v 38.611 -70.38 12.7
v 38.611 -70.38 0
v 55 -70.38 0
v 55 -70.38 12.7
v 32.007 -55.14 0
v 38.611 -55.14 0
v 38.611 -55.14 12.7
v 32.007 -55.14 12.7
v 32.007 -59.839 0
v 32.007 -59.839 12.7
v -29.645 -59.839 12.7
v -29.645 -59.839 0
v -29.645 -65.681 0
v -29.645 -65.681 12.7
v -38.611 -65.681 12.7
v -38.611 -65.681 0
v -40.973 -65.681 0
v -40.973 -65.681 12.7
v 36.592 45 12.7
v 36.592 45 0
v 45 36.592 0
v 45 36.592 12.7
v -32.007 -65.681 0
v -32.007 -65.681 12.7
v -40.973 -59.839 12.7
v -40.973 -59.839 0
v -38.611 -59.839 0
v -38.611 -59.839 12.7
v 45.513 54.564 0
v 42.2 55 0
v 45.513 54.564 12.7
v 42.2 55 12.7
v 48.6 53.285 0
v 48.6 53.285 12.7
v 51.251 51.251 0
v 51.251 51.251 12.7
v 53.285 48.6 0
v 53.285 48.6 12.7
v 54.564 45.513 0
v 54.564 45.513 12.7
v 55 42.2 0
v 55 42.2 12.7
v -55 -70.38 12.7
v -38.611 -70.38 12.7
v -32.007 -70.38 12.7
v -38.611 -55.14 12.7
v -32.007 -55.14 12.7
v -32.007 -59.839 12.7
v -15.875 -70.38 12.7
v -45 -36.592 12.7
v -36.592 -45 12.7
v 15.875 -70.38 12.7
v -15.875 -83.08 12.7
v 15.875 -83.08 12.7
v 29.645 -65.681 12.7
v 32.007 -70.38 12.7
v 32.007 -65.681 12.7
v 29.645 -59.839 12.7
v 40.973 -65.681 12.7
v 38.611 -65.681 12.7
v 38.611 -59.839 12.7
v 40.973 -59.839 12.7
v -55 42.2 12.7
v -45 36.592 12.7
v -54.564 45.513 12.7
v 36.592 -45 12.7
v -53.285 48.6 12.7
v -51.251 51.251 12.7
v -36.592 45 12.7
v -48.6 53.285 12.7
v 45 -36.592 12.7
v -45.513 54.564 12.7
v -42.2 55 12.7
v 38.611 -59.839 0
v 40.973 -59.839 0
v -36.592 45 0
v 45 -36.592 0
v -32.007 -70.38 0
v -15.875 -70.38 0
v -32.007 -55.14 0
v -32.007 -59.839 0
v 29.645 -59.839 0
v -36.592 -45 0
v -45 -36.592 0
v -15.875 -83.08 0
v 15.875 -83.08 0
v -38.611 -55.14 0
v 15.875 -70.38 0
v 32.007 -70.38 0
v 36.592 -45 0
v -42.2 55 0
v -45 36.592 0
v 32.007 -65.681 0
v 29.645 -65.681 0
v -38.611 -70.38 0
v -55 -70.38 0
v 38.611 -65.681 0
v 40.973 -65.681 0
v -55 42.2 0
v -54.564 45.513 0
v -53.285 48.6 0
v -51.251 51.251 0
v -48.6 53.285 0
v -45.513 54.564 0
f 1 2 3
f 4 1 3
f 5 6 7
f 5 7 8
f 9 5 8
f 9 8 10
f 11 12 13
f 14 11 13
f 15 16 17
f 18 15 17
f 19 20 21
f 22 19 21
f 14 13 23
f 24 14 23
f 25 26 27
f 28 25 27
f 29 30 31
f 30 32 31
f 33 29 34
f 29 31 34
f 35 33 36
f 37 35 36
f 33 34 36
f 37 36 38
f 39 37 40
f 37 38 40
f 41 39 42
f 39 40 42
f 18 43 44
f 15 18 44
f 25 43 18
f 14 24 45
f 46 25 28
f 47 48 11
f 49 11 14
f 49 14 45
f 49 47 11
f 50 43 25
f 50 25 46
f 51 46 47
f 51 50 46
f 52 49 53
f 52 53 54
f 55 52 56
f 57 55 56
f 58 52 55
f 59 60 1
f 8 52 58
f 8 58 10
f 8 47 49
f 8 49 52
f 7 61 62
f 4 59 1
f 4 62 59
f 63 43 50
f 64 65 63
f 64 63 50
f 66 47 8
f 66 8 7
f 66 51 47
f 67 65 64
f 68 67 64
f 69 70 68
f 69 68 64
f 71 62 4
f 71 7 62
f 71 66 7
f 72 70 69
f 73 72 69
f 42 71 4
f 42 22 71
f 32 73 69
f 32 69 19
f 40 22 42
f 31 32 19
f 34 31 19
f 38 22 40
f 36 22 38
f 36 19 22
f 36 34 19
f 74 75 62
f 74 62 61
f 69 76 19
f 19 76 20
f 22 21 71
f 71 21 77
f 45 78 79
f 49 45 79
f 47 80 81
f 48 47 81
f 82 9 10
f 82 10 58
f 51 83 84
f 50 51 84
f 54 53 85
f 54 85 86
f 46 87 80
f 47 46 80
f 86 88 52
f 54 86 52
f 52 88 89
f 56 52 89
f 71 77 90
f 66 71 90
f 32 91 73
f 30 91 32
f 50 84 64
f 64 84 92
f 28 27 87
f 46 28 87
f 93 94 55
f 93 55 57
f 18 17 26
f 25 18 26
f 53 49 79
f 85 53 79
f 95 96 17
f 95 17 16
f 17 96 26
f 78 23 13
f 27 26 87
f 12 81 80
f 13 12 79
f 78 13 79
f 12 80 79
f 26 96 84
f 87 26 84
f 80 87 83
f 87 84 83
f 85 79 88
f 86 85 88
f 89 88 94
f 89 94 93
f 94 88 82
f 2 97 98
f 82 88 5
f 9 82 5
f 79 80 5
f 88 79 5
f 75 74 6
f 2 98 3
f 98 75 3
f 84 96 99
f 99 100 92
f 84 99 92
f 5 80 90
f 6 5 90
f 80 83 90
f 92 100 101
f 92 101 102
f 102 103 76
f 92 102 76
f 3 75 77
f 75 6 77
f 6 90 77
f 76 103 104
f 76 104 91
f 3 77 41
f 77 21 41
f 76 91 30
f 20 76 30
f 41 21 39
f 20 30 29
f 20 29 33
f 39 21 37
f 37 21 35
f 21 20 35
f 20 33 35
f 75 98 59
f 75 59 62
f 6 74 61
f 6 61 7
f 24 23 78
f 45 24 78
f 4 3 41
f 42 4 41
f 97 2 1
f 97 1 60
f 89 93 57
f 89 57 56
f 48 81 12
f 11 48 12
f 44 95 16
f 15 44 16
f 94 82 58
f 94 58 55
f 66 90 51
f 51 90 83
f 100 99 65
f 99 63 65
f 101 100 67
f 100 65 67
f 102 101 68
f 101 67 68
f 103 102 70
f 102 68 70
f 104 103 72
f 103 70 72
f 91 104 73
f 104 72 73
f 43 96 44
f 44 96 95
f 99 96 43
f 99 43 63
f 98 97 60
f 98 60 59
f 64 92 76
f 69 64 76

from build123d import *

# Parameters (mm, degrees)
SKETCH2_W           = 110
SKETCH2_H           = 125.38
BOSS_EXTRUDE1_DEPTH = 12.7
FILLET1_R           = 12.8
CUT_EXTRUDE1_DEPTH  = 12.7
BOSS_EXTRUDE2_DEPTH = 12.7


with BuildPart() as part:
    # Sketch2 → Boss-Extrude1 (new body)
    with BuildSketch(Plane.XY):
        with Locations((0, -7.69)):
            Rectangle(SKETCH2_W, SKETCH2_H)
        Polygon((-45, -36.592348927), (-45, 36.592348927), (-36.592348927, 45), (36.592348927, 45), (45, 36.592348927), (45, -36.592348927), (36.592348927, -45), (-36.592348927, -45), align=None, mode=Mode.SUBTRACT)
    extrude(amount=BOSS_EXTRUDE1_DEPTH)

    # Fillet1
    fillet1_edges = [part.edges().sort_by_distance(p)[0] for p in [
        (55, 55, 6.35),
        (-55, 55, 6.35),
    ]]
    fillet(fillet1_edges, radius=FILLET1_R)

    # Sketch5 → Cut-Extrude1 (cut)
    with BuildSketch(Plane(origin=(0, 0, 0), x_dir=(-1, 0, 0), z_dir=(0, 0, -1))):
        Polygon((-38.610878355, -70.38), (-38.610878355, -65.681), (-40.972878355, -65.681), (-40.972878355, -59.839), (-38.610878355, -59.839), (-38.610878355, -55.14), (-32.006878355, -55.14), (-32.006878355, -59.839), (-29.644878355, -59.839), (-29.644878355, -65.681), (-32.006878355, -65.681), (-32.006878355, -70.38), align=None)
        Polygon((32.006878355, -65.681), (32.006878355, -70.38), (38.610878355, -70.38), (38.610878355, -65.681), (40.972878355, -65.681), (40.972878355, -59.839), (38.610878355, -59.839), (38.610878355, -55.14), (32.006878355, -55.14), (32.006878355, -59.839), (29.644878355, -59.839), (29.644878355, -65.681), align=None)
    extrude(amount=-CUT_EXTRUDE1_DEPTH, mode=Mode.SUBTRACT)

    # Sketch6 → Boss-Extrude2 (add)
    with BuildSketch(Plane.XZ.offset(70.38)):
        Polygon((0, 0), (15.875, 0), (15.875, 12.7), (-15.875, 12.7), (-15.875, 0), align=None)
    extrude(amount=BOSS_EXTRUDE2_DEPTH)


solid = part.part
